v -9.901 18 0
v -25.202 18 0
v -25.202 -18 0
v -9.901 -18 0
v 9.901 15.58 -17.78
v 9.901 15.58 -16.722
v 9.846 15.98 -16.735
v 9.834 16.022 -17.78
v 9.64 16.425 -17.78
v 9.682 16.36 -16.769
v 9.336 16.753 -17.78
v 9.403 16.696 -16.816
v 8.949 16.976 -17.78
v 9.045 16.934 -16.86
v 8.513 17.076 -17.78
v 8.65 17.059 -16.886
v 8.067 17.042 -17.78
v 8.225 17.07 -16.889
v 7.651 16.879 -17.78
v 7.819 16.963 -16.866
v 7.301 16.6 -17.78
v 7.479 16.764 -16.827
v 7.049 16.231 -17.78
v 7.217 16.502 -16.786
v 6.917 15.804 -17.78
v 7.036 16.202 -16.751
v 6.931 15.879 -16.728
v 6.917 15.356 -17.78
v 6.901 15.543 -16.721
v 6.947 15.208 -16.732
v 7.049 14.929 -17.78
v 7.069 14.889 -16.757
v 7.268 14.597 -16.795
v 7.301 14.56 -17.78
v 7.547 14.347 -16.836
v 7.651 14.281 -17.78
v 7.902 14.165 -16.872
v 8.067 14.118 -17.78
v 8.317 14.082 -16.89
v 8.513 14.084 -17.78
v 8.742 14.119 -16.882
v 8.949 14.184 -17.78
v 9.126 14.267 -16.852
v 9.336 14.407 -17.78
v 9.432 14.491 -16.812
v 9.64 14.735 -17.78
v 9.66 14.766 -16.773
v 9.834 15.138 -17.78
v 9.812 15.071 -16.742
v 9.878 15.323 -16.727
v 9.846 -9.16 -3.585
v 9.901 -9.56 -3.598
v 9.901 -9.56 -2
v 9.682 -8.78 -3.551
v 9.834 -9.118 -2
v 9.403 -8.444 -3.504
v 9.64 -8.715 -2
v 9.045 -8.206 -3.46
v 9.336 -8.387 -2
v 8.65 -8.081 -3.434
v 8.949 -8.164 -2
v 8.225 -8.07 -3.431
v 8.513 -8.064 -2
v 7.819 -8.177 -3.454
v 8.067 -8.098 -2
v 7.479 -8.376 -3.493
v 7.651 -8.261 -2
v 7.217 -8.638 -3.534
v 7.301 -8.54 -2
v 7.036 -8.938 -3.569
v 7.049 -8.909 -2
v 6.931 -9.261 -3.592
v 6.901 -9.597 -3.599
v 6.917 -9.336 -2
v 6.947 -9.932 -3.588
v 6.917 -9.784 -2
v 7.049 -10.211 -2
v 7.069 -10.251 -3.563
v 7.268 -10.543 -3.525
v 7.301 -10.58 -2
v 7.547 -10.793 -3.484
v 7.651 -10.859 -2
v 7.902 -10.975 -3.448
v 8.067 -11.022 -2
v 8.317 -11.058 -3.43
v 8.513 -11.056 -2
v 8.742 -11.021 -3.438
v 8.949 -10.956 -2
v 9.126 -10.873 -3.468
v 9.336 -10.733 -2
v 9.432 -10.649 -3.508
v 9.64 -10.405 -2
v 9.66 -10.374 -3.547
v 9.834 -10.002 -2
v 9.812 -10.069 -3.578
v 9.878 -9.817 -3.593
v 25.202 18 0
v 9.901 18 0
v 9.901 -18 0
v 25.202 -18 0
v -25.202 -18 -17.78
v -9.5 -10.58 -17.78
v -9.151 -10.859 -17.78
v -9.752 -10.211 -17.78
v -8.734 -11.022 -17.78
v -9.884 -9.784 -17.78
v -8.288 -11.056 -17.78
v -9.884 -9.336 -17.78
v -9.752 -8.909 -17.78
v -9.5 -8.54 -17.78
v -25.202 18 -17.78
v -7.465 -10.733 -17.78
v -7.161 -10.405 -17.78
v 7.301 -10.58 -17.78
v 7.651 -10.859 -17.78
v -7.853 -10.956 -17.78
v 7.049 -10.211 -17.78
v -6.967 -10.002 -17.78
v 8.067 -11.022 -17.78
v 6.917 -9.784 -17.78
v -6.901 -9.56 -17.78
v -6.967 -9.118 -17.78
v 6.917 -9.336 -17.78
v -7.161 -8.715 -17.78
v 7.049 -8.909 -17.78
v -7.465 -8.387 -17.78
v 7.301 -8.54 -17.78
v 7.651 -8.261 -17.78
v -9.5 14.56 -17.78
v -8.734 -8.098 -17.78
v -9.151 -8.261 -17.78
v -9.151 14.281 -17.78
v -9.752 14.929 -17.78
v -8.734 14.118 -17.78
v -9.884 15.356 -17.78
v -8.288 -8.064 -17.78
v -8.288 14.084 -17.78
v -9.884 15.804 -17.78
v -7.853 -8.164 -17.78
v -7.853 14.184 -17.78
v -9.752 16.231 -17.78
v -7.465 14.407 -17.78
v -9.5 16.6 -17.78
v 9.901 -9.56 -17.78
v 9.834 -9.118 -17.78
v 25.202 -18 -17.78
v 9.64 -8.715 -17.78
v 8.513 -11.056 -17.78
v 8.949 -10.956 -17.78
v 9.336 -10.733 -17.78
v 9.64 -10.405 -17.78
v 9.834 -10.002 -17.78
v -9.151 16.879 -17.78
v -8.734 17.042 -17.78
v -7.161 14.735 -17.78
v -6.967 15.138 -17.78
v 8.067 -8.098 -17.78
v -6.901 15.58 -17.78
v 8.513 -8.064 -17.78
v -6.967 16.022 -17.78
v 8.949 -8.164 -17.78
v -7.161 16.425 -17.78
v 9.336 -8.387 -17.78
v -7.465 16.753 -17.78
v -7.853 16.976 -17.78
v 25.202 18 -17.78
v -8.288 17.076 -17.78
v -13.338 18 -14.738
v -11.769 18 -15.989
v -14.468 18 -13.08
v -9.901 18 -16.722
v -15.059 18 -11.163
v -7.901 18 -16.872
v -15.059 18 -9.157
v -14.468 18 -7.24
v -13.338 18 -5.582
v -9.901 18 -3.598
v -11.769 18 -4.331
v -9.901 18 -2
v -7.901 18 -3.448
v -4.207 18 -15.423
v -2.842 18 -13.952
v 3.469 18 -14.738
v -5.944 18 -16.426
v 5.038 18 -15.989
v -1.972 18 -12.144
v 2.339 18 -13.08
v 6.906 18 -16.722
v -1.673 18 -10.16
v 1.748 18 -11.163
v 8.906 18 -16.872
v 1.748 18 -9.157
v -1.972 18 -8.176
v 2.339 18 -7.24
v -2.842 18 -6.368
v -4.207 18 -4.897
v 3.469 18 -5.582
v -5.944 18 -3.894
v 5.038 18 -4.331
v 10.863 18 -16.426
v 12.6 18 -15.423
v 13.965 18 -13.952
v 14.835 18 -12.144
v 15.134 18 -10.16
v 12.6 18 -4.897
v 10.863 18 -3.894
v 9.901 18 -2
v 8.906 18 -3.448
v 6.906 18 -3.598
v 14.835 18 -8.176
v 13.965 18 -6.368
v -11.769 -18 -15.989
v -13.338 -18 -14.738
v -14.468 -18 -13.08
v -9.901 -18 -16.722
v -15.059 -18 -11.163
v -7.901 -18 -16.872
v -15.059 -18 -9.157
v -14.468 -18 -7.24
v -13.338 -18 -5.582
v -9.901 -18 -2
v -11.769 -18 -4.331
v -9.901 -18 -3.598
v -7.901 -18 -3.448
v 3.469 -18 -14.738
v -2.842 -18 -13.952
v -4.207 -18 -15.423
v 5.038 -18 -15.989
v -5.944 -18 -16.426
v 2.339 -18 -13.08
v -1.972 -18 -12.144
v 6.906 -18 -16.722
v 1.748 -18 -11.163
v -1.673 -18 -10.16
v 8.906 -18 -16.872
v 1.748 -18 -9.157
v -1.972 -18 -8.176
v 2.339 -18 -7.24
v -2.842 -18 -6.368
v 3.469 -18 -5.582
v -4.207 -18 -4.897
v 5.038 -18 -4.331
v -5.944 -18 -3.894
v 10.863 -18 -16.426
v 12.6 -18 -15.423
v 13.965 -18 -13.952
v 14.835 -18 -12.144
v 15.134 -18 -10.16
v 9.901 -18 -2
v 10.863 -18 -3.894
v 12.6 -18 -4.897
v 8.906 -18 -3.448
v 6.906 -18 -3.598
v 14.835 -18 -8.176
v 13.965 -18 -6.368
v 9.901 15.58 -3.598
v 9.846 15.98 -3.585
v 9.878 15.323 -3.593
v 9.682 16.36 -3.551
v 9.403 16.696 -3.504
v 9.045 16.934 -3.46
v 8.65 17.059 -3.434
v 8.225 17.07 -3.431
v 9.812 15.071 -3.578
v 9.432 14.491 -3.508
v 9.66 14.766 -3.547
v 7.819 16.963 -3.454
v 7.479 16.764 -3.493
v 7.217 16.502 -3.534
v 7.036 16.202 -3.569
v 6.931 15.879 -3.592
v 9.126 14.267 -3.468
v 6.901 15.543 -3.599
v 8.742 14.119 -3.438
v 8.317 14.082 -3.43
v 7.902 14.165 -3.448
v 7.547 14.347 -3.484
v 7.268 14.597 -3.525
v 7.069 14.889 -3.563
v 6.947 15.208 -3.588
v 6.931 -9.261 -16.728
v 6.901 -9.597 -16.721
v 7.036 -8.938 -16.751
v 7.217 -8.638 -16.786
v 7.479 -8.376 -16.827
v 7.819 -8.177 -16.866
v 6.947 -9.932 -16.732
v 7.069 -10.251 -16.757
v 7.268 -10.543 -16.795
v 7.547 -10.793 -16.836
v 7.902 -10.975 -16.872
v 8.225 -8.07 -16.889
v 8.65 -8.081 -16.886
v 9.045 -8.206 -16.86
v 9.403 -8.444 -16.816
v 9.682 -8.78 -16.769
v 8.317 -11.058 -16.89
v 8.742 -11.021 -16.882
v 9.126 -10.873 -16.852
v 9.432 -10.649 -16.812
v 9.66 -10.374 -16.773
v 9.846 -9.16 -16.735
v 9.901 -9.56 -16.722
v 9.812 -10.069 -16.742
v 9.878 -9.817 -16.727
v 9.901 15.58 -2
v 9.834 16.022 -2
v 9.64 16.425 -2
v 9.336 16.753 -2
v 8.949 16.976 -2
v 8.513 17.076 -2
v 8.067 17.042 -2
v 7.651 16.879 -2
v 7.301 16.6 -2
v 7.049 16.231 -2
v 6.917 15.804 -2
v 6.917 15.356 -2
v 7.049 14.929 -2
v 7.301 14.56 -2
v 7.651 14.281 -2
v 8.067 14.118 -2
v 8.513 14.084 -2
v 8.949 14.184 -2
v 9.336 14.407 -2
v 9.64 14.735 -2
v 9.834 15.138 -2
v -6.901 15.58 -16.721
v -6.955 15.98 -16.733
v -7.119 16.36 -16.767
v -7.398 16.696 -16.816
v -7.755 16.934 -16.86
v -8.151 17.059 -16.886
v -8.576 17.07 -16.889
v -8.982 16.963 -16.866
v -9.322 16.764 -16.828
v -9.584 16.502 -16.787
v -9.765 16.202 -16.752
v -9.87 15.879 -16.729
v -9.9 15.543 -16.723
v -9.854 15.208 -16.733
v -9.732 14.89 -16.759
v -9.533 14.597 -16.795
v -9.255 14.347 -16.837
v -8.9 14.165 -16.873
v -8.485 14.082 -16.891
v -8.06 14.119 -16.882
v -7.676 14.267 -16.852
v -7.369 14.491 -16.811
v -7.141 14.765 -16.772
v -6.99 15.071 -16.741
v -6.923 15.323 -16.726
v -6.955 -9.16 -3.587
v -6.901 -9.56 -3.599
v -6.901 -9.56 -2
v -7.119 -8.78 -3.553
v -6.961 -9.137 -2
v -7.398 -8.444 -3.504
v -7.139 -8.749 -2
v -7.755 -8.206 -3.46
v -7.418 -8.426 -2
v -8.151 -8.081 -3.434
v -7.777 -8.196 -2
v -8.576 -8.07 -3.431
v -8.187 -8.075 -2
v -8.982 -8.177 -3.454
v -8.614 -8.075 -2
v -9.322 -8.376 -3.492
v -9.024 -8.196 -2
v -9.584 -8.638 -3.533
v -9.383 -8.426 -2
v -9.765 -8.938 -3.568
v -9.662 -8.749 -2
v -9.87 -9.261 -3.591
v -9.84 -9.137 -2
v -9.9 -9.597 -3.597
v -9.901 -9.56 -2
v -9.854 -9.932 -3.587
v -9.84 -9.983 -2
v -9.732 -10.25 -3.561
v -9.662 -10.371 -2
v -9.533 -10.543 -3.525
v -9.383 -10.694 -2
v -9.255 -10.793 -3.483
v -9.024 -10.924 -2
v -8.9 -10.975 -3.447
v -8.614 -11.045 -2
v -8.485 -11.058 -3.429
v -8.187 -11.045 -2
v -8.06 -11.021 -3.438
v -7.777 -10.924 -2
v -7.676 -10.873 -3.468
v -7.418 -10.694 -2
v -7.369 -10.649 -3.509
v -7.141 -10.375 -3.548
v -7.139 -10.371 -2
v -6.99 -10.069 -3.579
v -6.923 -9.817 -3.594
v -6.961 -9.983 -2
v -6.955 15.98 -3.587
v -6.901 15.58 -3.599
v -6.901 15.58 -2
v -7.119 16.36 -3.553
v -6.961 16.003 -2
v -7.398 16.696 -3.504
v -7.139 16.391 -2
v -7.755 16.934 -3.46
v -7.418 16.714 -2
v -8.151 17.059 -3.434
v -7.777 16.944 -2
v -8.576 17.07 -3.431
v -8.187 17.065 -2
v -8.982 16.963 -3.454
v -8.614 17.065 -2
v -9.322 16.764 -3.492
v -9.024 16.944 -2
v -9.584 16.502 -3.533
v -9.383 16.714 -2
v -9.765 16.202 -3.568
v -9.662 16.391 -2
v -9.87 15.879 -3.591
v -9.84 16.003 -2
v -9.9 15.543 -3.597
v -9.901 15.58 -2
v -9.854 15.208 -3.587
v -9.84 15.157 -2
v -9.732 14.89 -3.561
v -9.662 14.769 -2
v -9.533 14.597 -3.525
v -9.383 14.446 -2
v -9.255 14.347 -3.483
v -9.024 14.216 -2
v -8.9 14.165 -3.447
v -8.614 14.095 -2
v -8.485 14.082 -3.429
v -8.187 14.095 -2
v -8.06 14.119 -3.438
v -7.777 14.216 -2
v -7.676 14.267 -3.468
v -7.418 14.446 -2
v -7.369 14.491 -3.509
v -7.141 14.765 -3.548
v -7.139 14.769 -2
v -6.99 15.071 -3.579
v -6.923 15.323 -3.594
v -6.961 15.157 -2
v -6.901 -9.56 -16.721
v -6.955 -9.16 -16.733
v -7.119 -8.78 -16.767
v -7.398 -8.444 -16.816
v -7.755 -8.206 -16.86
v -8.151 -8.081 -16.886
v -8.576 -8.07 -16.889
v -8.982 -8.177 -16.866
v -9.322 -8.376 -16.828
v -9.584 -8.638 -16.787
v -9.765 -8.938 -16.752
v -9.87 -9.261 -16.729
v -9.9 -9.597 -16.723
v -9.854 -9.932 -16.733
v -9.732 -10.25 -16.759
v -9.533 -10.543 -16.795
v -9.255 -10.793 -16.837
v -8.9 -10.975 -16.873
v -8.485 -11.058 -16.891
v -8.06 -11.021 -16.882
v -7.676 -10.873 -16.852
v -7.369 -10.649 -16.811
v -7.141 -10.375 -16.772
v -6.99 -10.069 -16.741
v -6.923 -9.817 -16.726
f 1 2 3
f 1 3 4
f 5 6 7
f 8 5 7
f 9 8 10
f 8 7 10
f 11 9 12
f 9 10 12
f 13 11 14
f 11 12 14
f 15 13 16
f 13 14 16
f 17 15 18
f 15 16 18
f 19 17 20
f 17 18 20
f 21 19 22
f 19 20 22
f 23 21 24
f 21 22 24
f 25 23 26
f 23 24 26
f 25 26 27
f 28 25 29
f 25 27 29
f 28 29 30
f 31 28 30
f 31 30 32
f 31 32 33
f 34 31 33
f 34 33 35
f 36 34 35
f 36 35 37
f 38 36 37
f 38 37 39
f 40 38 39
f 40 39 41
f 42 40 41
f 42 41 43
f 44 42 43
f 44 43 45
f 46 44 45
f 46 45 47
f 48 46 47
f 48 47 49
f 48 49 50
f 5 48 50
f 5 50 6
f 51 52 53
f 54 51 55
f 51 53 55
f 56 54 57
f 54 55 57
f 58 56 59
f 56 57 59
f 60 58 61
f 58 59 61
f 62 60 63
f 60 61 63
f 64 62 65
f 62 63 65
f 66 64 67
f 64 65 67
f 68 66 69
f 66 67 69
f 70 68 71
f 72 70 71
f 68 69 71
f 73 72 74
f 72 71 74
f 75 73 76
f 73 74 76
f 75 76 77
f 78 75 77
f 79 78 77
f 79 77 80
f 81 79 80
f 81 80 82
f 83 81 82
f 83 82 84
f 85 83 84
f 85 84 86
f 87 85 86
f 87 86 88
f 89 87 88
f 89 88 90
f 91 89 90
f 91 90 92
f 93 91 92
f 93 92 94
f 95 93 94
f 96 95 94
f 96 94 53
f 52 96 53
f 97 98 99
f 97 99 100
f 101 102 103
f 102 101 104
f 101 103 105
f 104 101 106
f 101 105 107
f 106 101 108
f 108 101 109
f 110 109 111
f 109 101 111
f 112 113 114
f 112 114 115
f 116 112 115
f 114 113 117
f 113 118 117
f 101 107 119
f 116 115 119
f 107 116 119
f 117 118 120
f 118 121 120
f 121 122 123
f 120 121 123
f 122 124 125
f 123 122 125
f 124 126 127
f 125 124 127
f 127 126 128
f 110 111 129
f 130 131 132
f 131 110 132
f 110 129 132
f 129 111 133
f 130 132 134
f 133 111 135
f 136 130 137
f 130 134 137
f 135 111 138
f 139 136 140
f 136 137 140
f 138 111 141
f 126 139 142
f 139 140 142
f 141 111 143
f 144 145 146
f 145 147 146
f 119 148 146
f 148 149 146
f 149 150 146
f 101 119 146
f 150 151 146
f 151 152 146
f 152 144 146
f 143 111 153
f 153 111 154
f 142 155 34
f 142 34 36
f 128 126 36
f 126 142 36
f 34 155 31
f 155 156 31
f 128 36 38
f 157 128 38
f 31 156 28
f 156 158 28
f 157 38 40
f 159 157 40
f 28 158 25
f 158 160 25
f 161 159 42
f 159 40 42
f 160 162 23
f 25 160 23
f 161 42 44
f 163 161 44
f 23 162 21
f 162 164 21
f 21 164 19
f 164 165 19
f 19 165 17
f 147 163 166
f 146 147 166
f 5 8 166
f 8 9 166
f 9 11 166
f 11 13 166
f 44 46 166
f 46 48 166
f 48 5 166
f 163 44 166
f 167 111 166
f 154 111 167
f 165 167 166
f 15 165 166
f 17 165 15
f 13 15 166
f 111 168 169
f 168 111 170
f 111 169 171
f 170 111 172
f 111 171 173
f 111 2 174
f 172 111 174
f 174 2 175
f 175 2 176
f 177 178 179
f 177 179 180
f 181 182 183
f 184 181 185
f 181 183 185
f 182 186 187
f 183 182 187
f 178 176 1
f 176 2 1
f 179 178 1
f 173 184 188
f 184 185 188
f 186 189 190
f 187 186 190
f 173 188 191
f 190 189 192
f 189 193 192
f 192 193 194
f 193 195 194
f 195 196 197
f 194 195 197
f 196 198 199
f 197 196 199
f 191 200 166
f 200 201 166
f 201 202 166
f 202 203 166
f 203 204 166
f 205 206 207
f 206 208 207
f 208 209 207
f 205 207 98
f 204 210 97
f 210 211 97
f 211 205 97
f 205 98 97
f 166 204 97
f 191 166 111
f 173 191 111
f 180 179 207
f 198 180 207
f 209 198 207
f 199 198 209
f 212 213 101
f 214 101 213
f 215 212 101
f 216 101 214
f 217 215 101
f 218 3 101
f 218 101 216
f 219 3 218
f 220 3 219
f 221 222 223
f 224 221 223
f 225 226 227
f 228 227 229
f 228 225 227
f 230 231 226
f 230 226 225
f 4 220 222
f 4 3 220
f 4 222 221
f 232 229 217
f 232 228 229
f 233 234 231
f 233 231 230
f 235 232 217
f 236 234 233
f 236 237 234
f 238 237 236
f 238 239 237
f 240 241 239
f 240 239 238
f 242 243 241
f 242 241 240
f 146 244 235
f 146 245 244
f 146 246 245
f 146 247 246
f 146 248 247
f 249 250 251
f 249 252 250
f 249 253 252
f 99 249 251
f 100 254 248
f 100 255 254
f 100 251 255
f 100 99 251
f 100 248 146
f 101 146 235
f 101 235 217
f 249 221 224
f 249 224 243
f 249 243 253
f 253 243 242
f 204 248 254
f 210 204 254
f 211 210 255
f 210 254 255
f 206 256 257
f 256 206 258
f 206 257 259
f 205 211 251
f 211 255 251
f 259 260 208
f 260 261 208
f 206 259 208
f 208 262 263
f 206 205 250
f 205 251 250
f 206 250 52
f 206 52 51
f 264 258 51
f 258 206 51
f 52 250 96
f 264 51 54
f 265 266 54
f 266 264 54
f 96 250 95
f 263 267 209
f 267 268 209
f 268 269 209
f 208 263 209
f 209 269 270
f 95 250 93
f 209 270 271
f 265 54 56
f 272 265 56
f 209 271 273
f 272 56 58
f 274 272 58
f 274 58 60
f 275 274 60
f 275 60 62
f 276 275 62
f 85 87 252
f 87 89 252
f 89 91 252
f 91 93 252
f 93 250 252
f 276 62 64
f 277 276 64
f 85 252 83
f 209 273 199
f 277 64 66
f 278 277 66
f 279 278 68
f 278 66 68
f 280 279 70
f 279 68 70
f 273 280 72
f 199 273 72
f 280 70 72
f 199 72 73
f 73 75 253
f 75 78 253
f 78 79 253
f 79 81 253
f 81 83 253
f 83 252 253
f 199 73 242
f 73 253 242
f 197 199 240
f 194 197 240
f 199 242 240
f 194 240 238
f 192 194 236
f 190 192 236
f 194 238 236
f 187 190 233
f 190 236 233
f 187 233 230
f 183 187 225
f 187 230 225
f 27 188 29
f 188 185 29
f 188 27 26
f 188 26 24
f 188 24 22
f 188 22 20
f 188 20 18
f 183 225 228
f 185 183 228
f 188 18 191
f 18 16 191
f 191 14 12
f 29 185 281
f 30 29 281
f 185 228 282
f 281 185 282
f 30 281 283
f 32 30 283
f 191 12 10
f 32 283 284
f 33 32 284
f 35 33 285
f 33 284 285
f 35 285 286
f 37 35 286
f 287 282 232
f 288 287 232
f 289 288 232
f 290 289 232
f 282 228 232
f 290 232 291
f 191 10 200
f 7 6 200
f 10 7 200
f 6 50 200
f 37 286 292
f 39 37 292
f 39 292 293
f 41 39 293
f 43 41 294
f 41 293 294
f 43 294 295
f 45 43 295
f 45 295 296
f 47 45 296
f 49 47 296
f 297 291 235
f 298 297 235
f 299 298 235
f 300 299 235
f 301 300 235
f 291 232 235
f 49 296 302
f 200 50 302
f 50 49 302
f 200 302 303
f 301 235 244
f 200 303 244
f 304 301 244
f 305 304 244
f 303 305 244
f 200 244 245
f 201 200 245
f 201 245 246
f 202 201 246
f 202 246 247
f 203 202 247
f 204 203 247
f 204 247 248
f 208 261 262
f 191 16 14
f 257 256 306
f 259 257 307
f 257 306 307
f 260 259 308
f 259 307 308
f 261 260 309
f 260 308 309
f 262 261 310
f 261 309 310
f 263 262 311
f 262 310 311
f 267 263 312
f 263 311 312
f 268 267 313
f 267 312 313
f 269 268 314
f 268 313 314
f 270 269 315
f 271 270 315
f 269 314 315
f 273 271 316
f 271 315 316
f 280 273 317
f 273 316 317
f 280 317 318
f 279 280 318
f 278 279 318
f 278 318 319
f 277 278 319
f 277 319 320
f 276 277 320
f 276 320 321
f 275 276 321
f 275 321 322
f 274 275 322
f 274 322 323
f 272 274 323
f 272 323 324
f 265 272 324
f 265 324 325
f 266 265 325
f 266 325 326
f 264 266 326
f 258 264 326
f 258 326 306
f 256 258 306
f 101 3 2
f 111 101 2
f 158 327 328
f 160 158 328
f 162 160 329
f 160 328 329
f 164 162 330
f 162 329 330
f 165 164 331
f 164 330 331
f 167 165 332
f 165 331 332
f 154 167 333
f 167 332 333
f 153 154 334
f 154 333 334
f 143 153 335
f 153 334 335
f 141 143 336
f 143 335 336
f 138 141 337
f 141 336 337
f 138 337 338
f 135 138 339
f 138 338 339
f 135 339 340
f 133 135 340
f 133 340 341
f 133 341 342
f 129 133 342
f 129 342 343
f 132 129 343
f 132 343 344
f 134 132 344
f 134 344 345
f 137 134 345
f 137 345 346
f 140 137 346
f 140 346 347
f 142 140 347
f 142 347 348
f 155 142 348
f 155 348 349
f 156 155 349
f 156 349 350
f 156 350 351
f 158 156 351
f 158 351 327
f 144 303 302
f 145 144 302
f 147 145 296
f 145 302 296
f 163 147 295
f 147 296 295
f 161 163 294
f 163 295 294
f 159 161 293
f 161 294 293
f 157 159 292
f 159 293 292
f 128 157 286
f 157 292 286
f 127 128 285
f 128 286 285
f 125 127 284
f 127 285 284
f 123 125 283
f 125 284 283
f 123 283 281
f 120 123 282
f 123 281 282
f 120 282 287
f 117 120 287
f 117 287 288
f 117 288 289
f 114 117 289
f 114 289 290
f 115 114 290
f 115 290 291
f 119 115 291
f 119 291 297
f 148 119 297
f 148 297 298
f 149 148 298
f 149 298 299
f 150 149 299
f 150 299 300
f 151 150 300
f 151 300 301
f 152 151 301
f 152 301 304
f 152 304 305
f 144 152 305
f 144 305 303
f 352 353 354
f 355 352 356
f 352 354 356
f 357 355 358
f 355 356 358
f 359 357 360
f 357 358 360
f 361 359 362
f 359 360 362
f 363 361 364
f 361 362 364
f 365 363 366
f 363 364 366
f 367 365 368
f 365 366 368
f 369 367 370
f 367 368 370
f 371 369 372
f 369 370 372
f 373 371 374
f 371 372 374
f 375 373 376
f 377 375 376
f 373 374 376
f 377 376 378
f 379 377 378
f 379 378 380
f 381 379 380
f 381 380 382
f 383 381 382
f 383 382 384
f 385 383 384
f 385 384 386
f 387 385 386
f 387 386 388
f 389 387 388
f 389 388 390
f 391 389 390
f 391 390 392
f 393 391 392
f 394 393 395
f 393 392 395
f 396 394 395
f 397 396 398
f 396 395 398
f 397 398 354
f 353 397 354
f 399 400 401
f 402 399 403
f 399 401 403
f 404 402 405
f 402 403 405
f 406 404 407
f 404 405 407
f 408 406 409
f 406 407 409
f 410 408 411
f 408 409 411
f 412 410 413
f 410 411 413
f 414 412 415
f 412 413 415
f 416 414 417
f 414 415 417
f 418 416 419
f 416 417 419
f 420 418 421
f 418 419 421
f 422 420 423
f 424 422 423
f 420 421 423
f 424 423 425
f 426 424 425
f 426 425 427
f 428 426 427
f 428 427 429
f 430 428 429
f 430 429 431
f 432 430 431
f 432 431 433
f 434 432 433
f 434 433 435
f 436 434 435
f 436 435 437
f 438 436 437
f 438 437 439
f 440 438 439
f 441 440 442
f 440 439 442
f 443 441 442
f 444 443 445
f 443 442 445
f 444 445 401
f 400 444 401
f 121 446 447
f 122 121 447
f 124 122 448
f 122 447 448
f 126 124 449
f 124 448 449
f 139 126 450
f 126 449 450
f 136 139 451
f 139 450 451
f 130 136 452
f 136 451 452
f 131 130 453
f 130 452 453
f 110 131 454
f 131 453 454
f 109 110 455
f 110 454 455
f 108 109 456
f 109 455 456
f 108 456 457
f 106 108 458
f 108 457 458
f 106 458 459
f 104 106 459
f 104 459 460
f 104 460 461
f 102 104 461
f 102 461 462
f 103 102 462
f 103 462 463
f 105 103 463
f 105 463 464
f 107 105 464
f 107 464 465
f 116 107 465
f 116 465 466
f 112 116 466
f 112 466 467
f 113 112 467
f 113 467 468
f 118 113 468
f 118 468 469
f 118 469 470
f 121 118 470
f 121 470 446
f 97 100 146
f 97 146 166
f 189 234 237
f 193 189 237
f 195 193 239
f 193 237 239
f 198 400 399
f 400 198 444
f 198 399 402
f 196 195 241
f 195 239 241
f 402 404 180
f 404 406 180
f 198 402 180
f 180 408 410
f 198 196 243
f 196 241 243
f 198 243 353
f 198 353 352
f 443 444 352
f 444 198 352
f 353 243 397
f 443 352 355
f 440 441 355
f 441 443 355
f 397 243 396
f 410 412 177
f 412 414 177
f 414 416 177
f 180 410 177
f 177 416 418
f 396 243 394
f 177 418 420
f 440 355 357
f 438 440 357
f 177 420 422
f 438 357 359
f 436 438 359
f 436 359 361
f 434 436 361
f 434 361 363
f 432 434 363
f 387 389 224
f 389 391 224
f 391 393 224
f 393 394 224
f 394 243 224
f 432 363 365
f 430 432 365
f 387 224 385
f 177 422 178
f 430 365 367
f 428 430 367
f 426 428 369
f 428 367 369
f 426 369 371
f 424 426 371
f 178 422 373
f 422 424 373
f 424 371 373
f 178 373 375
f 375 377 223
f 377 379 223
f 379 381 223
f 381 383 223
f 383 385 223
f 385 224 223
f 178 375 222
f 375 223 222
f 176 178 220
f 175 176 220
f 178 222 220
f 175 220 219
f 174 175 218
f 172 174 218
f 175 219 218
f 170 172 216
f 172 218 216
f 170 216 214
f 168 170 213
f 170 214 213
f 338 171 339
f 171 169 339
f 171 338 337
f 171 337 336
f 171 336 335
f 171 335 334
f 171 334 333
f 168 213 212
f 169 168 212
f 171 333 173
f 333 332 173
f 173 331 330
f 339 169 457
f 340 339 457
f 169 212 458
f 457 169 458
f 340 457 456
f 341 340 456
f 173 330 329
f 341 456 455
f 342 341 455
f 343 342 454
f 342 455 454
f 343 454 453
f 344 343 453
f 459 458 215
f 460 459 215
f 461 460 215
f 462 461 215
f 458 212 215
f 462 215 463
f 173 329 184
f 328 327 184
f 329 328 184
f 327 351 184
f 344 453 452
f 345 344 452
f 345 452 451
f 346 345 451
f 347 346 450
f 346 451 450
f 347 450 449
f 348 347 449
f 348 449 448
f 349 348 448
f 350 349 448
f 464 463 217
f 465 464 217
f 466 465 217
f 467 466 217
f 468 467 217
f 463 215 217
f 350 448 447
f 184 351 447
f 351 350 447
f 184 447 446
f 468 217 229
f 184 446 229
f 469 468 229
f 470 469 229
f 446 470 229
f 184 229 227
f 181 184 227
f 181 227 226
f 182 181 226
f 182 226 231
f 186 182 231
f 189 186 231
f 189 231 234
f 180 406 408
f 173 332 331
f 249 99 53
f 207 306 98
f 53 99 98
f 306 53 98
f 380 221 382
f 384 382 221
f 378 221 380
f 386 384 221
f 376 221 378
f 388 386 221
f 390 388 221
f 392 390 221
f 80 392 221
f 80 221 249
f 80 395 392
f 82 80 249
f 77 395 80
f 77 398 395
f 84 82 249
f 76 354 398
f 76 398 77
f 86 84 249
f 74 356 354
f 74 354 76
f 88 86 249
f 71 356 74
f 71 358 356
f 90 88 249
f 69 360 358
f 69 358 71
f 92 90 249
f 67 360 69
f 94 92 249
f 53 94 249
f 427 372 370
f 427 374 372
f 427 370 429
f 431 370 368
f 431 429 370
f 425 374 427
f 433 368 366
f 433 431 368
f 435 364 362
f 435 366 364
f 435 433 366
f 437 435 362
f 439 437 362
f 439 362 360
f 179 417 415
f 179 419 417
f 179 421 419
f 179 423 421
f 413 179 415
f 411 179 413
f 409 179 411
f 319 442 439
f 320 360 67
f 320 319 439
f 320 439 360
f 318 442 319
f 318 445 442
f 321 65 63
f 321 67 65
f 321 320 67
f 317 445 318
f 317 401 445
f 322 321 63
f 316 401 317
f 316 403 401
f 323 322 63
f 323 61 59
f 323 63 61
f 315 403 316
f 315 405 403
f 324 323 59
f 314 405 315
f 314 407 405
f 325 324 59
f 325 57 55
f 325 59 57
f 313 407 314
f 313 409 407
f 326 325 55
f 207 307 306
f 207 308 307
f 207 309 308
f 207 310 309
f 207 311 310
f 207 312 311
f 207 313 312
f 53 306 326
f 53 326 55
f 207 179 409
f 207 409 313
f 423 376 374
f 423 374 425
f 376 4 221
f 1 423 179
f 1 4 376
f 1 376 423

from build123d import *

# Parameters (mm, degrees)
F0_W     = 50.40313
F0_H     = 36
F0_R     = 1.5
F1_DEPTH = 17.78
F3_R     = 6.731
F4_DEPTH = 63.2
F5_W     = 19.80113
F5_H     = 36
F6_DEPTH = 2


with BuildPart() as f1:
    # F0 (on Top) → F1 (new body)
    with BuildSketch(Plane.XY):
        Rectangle(F0_W, F0_H)
        with Locations((-8.400565, -9.56)):
            Circle(F0_R, mode=Mode.SUBTRACT)
        with Locations((8.400565, -9.56)):
            Circle(F0_R, mode=Mode.SUBTRACT)
        with Locations((-8.400565, 15.58)):
            Circle(F0_R, mode=Mode.SUBTRACT)
        with Locations((8.400565, 15.58)):
            Circle(F0_R, mode=Mode.SUBTRACT)
    extrude(amount=-F1_DEPTH)

    # F3 (on face) → F4 (cut)
    with BuildSketch(Plane.XZ.offset(18)):
        with Locations((-8.403565, -10.16)):
            Circle(F3_R)
        with Locations((8.403435, -10.16)):
            Circle(F3_R)
    extrude(amount=-F4_DEPTH, mode=Mode.SUBTRACT)

    # F5 (on face) → F6 (cut)
    with BuildSketch(Plane.XY):
        Rectangle(F5_W, F5_H)
    extrude(amount=-F6_DEPTH, mode=Mode.SUBTRACT)


solid = f1.part
